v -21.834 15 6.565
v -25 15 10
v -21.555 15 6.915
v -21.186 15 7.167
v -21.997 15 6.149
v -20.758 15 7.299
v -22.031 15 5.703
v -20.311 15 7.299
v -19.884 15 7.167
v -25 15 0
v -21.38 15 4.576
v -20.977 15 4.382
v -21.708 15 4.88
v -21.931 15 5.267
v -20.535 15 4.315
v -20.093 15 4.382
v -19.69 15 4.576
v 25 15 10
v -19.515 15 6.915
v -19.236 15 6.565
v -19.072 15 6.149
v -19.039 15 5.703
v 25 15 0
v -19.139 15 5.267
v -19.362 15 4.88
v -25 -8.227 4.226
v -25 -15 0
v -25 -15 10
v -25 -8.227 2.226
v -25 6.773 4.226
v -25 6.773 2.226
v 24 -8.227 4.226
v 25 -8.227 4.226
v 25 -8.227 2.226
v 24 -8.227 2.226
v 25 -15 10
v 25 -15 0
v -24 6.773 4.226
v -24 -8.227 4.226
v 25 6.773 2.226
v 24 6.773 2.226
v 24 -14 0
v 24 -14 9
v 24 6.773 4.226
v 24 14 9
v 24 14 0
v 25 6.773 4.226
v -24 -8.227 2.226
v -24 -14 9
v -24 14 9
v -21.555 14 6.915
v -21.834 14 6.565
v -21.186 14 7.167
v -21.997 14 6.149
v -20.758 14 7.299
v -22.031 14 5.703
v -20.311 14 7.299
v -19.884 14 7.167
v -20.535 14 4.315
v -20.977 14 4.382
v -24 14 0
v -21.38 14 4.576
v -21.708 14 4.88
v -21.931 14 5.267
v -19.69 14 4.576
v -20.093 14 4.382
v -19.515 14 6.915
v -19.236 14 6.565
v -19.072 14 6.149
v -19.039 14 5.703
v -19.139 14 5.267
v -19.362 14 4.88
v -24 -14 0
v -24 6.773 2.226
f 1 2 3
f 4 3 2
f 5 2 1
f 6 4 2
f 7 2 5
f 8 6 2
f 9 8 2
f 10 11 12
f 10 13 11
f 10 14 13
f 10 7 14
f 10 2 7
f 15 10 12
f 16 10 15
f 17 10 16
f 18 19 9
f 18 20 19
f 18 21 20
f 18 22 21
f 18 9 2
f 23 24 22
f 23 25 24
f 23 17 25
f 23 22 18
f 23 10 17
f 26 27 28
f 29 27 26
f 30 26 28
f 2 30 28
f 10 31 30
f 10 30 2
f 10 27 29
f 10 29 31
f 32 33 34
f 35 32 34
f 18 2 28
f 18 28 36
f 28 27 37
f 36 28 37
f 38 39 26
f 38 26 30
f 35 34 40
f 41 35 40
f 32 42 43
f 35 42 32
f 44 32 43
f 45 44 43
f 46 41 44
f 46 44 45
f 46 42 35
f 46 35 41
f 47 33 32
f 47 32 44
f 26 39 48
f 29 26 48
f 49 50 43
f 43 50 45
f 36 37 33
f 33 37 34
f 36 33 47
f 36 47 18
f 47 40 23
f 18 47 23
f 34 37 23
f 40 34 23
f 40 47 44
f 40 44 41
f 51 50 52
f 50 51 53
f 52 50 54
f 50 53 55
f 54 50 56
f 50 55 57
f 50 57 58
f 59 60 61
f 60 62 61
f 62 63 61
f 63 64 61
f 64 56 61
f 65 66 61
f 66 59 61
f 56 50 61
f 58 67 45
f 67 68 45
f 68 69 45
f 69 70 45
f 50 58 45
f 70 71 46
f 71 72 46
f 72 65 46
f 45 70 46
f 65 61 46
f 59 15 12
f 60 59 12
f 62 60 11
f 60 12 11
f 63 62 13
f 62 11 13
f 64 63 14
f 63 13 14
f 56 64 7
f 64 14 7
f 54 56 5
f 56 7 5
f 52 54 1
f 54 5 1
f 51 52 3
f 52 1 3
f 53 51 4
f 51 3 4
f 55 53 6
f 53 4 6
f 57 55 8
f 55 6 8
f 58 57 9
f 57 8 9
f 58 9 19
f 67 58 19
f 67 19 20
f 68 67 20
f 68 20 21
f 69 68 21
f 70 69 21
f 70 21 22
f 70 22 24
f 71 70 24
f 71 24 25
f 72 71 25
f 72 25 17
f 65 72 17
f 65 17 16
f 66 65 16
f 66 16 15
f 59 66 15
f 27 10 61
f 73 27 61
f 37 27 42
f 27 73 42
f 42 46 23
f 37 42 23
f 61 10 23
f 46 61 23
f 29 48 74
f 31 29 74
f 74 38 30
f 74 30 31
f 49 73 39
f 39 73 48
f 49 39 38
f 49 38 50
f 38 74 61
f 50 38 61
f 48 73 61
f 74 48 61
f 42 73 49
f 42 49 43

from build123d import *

# Parameters (mm, degrees)
SKETCH1_W           = 50
SKETCH1_H           = 30
BOSS_EXTRUDE1_DEPTH = 10
SHELL4_T            = -1
SKETCH9_W           = 2
SKETCH9_H           = 15
CUT_EXTRUDE5_DEPTH  = 63.649820431
SKETCH10_R          = 1.5
CUT_EXTRUDE6_DEPTH  = 21


with BuildPart() as part:
    # Sketch1 → Boss-Extrude1 (new body)
    with BuildSketch(Plane.XY):
        Rectangle(SKETCH1_W, SKETCH1_H)
    extrude(amount=BOSS_EXTRUDE1_DEPTH)

    # Shell4
    shell4_openings = [part.faces().sort_by_distance(p)[0] for p in [
        (0, 0, 0),
    ]]
    offset(amount=SHELL4_T, openings=shell4_openings, kind=Kind.INTERSECTION)

    # Sketch9 → Cut-Extrude5 (cut, through all)
    with BuildSketch(Plane(origin=(35, 0, 0), x_dir=(0, 0, -1), z_dir=(1, 0, 0))):
        with Locations((-3.225993387, -0.726962262)):
            Rectangle(SKETCH9_W, SKETCH9_H)
    extrude(amount=-CUT_EXTRUDE5_DEPTH, mode=Mode.SUBTRACT)

    # Sketch10 → Cut-Extrude6 (cut)
    with BuildSketch(Plane(origin=(0, 25, 0), x_dir=(1, 0, 0), z_dir=(0, 1, 0))):
        with Locations(Location((-20.534888549, -5.815355869, 0), (0, 0, 90))):
            Circle(SKETCH10_R)
    extrude(amount=-CUT_EXTRUDE6_DEPTH, mode=Mode.SUBTRACT)


solid = part.part
